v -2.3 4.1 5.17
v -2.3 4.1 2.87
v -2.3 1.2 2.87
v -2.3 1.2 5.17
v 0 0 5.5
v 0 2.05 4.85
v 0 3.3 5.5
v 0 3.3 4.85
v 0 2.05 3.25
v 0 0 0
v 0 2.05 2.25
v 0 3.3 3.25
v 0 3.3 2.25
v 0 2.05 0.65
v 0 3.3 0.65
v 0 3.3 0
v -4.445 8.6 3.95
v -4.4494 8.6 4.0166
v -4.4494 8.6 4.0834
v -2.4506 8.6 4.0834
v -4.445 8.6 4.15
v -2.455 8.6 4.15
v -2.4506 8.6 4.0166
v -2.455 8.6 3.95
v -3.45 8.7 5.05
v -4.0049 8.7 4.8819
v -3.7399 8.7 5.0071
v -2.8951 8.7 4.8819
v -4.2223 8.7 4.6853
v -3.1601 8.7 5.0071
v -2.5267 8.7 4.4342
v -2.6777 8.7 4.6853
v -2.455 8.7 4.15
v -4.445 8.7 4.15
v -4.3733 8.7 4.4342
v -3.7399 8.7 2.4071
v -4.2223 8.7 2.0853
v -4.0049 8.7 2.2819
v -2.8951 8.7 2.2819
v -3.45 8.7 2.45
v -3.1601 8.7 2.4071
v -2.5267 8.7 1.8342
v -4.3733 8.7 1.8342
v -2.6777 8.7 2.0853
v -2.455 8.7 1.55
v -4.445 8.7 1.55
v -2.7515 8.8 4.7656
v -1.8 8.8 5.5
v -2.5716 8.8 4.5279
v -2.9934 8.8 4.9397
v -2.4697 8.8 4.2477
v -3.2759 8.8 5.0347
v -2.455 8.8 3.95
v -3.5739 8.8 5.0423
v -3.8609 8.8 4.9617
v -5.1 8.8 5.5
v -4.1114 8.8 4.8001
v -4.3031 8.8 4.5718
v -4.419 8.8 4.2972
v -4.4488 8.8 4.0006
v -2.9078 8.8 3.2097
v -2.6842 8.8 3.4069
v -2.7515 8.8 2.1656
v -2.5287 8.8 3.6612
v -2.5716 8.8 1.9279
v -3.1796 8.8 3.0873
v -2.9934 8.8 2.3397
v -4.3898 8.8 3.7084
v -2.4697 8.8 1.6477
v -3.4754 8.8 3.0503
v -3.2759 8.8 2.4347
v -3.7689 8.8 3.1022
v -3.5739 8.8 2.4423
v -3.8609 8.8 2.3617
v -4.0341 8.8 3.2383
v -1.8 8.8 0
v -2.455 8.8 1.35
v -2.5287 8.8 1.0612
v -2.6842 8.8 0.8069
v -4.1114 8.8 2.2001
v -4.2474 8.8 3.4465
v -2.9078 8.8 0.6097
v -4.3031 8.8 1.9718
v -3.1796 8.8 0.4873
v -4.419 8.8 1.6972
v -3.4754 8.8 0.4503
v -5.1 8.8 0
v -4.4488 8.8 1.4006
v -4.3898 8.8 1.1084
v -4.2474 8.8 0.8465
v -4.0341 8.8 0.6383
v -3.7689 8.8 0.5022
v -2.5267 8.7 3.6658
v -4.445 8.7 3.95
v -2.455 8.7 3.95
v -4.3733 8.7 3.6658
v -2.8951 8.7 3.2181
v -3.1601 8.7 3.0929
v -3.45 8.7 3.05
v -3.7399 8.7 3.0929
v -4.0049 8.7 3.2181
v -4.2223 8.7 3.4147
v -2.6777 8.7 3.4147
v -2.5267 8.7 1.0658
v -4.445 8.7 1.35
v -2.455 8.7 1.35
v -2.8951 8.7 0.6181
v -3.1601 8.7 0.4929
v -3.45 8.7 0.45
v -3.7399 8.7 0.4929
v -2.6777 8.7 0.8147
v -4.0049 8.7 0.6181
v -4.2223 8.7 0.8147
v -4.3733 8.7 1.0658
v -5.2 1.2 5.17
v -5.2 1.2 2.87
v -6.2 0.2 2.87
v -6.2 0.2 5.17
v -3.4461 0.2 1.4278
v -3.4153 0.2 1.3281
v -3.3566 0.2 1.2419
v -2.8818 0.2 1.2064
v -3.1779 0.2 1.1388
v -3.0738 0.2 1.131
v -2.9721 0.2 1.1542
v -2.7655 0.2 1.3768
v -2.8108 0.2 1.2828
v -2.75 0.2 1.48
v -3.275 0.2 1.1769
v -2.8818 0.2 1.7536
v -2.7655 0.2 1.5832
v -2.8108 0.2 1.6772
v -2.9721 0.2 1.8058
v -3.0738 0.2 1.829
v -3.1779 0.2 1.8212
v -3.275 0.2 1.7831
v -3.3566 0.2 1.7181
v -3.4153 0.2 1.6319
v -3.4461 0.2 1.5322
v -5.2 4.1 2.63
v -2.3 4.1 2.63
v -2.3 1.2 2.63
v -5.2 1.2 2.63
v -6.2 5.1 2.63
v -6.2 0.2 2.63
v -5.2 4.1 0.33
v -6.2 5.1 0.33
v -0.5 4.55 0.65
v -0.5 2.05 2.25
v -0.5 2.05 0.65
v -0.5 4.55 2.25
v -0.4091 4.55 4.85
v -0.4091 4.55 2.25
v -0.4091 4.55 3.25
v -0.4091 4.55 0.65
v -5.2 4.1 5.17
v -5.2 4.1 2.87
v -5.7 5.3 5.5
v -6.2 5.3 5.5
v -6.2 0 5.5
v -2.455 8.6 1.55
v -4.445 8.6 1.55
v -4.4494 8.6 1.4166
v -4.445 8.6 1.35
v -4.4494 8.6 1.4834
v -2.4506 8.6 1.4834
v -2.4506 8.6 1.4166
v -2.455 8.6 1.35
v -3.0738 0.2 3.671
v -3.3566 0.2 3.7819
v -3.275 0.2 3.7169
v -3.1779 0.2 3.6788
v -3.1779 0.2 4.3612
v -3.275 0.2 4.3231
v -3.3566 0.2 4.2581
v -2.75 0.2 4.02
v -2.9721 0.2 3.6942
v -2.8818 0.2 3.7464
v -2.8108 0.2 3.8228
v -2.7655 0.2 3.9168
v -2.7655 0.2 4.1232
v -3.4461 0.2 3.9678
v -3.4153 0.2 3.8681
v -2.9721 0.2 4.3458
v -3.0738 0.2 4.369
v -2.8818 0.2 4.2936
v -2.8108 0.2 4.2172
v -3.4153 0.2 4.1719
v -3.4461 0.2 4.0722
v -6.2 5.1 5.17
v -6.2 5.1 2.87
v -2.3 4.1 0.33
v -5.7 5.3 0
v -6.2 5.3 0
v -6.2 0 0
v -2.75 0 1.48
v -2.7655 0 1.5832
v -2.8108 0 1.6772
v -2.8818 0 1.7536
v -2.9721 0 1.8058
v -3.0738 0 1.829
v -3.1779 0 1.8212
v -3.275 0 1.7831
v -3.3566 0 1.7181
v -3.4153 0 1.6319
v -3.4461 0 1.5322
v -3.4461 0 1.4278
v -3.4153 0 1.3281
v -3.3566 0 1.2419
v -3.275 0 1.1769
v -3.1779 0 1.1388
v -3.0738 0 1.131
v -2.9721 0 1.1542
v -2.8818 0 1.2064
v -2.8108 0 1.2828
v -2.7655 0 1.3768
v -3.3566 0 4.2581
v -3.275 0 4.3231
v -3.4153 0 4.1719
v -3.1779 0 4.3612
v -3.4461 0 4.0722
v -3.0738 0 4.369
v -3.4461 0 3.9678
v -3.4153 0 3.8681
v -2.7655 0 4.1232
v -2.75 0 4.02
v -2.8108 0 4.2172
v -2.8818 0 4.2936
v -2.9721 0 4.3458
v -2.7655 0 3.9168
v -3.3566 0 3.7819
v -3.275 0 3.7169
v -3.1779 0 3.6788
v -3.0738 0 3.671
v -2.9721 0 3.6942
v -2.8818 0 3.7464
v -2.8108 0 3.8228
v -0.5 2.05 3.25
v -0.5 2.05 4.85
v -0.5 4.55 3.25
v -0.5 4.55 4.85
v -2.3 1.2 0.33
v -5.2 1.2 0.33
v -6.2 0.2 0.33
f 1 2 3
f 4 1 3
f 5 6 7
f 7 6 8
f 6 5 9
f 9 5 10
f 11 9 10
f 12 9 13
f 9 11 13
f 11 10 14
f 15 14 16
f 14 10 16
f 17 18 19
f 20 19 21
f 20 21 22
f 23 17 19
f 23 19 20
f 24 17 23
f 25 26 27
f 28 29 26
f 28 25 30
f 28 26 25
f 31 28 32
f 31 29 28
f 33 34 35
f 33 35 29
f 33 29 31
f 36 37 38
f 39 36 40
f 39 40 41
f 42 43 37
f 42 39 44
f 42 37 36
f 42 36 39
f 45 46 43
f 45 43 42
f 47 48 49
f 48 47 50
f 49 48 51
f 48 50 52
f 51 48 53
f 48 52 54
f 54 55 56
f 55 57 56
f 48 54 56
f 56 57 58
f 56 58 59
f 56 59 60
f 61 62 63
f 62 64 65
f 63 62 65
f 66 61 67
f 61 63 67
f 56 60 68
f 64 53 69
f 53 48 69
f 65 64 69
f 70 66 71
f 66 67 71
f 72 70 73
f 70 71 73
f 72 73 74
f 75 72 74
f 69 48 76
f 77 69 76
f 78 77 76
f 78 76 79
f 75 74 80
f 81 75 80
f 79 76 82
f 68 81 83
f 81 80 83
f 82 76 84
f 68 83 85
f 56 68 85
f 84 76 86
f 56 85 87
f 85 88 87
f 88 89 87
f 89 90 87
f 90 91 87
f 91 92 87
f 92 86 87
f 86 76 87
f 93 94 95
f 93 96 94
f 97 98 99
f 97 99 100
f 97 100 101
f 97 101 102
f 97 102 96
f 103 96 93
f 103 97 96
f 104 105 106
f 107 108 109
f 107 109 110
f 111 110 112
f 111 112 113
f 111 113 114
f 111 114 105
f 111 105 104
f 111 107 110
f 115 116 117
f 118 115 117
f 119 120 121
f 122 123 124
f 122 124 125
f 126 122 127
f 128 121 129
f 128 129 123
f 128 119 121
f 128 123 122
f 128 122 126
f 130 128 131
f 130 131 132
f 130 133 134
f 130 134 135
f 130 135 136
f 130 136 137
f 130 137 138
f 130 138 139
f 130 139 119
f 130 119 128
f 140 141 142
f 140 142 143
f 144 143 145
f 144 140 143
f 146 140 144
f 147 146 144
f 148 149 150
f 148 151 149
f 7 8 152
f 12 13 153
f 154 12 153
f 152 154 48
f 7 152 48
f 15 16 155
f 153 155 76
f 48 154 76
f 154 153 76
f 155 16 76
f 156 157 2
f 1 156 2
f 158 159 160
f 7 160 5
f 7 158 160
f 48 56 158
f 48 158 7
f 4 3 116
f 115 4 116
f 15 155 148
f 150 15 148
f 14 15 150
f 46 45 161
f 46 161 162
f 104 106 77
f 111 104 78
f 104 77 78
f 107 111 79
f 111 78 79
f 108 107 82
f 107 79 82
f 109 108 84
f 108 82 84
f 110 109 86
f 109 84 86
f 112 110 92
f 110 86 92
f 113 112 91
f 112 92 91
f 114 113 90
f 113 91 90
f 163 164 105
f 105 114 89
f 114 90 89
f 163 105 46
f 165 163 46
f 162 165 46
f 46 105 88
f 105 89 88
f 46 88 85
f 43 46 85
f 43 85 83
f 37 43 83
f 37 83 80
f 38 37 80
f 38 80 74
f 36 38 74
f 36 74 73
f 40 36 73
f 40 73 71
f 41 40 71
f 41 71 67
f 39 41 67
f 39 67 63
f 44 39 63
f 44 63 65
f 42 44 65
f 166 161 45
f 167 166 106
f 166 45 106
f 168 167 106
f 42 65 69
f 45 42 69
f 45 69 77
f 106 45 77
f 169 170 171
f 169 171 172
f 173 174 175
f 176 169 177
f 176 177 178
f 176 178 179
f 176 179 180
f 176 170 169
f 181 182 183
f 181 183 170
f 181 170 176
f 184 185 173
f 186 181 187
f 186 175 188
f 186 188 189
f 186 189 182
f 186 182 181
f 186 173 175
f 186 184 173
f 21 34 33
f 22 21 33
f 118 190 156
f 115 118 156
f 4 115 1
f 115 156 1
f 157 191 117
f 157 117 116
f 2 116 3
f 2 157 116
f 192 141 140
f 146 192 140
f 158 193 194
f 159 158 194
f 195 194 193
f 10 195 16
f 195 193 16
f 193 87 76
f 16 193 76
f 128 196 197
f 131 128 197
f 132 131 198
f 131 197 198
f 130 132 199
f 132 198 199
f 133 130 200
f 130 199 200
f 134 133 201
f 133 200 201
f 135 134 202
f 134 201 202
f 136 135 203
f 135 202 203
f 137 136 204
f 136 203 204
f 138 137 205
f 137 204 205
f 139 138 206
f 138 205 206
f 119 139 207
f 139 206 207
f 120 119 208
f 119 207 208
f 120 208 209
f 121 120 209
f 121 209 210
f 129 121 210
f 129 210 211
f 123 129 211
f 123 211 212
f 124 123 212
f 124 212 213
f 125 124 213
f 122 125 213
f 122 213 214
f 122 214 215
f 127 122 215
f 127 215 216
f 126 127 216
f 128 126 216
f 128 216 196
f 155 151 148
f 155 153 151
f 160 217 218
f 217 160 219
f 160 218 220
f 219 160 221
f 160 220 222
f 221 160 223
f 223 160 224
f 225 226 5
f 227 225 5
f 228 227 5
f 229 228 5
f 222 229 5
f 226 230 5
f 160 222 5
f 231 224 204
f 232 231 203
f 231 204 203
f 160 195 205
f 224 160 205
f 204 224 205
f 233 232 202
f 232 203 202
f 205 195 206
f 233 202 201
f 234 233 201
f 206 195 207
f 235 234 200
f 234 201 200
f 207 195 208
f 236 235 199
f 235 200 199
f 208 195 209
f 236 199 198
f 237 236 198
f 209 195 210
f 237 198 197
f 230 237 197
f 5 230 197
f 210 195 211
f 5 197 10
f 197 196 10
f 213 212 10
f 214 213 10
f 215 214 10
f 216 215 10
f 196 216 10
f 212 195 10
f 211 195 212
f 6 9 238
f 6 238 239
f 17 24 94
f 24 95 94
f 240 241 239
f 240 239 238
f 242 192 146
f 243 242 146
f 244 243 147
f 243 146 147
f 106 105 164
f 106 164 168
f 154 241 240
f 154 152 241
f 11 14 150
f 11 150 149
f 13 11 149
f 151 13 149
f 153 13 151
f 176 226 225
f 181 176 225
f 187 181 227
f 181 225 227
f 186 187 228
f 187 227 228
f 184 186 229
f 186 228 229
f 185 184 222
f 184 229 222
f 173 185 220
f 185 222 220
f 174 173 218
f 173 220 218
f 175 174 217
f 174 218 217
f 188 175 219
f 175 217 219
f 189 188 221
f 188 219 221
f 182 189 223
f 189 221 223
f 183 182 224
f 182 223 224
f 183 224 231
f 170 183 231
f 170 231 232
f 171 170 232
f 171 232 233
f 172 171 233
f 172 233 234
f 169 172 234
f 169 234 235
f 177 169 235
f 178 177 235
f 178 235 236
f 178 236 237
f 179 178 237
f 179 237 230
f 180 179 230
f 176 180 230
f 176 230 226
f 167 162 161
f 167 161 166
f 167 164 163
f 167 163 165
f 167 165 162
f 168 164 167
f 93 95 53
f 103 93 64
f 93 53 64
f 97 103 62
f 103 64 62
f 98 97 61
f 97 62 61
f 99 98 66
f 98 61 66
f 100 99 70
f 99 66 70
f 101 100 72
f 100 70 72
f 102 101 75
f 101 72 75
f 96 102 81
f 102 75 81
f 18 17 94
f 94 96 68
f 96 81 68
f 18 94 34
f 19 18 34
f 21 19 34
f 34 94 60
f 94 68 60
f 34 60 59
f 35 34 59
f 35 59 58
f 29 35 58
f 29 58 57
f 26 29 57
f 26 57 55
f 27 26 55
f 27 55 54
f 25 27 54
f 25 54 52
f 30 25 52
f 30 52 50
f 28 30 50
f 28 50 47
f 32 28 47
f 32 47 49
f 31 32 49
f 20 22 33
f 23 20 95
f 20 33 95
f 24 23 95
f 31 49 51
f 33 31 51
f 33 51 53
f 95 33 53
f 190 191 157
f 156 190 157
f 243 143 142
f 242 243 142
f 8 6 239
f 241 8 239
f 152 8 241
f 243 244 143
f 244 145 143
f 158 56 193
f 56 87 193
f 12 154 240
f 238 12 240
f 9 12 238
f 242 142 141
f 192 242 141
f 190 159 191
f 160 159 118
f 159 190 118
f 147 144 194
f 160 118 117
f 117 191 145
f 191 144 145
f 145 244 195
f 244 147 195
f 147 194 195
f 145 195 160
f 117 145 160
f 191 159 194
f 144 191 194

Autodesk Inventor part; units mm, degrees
ref_plane "YZ Plane" through (0, 0, 0) normal (1, 0, 0) x (0, 1, 0)
ref_plane "XZ Plane" through (0, 0, 0) normal (0, 1, 0) x (-1, 0, 0)
sketch "Sketch1" plane through (0, 0, 0) normal (0, 0, 1) x (1, 0, 0)
  line L0 (0, 0) -> (0, 3.3)
  line L1 (0, 3.3) -> (-1.8, 8.8)
  line L2 (-1.8, 8.8) -> (-5.1, 8.8)
  line L3 (-5.1, 8.8) -> (-5.7, 5.3)
  line L4 (-5.7, 5.3) -> (-6.2, 5.3)
  line L5 (-6.2, 5.3) -> (-6.2, 0)
  line L6 (-6.2, 0) -> (0, 0)
  dimension "d0" = 3.3
  dimension "d1" = 3.3
  dimension "d2" = 8.8
  dimension "d3" = 1.8
  dimension "d4" = 5.3
  dimension "d5" = 6.2
  dimension "d6" = 0.5
extrude "Extrusion1" add sketch "Sketch1" along normal blind 5.5
ref_plane "Work Plane2" through (0, 0, 4.02) normal (0, 0, 1) x (1, 0, 0)
ref_plane "Work Plane1" through (0, 0, 2.75) normal (0, 0, 1) x (1, 0, 0)
sketch "Sketch3" plane through (0, 0, 4.02) normal (0, 0, 1) x (1, 0, 0)
  line L0 (-6.2, 5.3) -> (-6.2, 0) projected
  line L1 (-6.2, 5.1) -> (-5.2, 4.1)
  line L2 (-5.2, 4.1) -> (-2.3, 4.1)
  line L3 (-2.3, 4.1) -> (-2.3, 1.2)
  line L4 (-2.3, 1.2) -> (-5.2, 1.2)
  line L5 (-5.2, 1.2) -> (-6.2, 0.2)
  line L6 (-6.2, 5.1) -> (-6.2, 0.2)
  line L7 (-5.7, 5.3) -> (-6.2, 5.3) projected
  line L8 (-6.2, 0) -> (0, 0) projected
  line L9 (-6.2, 2.65) -> (0, 2.65) construction
  line L10 (0, 0) -> (0, 3.3) construction
  dimension "d10" = 0.2
  dimension "d11" = 0.2
  dimension "d12" = 1
  dimension "d13" = 1
extrude "Extrusion2" cut sketch "Sketch3" along normal mid plane 2.3
mirror "Mirror1" about plane through (0, 0, 2.75) normal (0, 0, 1) of "Extrusion2"
sketch "Sketch4" plane through (0, 0, 0) normal (1, 0, 0) x (0, 0, -1)
  line L0 (-4.85, 4.55) -> (-3.25, 4.55)
  line L1 (-3.25, 4.55) -> (-3.25, 2.05)
  line L2 (-3.25, 2.05) -> (-4.85, 2.05)
  line L3 (-4.85, 2.05) -> (-4.85, 4.55)
  line L4 (-4.85, 4.55) -> (-3.25, 2.05) construction
  line L5 (-3.25, 4.55) -> (-4.85, 2.05) construction
  line L6 (-2.25, 4.55) -> (-0.65, 4.55)
  line L7 (-0.65, 4.55) -> (-0.65, 2.05)
  line L8 (-0.65, 2.05) -> (-2.25, 2.05)
  line L9 (-2.25, 2.05) -> (-2.25, 4.55)
  line L10 (-2.25, 4.55) -> (-0.65, 2.05) construction
  line L11 (-0.65, 4.55) -> (-2.25, 2.05) construction
  line L12 (0, 8.8) -> (-5.5, 8.8) construction
  line L13 (-2.75, 8.8) -> (-2.75, 0) construction
  line L14 (0, 0) -> (-5.5, 0) construction
  line L15 (0, 3.3) -> (-5.5, 3.3) construction
  point P0 (-4.05, 3.3)
  point P1 (-1.45, 3.3)
  dimension "d16" = 1.6
  dimension "d17" = 2.5
  dimension "d18" = 1
extrude "Extrusion3" cut sketch "Sketch4" against normal blind 0.5
sketch "Sketch5" plane through (-5.1, 8.8, 0) normal (0, 1, 0) x (1, 0, 0)
  circle A0 centre (1.65, -4.05) radius 1
  line L0 (-1.1, -5.5) -> (5.1, -5.5) construction
  line L1 (3.3, 0) -> (3.3, -5.5) construction
  line L2 (0, -5.5) -> (3.3, -5.5) construction
  line L3 (3.3, -5.5) -> (3.3, 0) construction
  line L4 (3.3, 0) -> (0, 0) construction
  line L5 (0, 0) -> (0, -5.5) construction
  line L6 (1.65, -5.5) -> (1.65, 0) construction
  line L7 (0, 0) -> (0, -5.5) construction
  line L8 (0, -2.75) -> (3.3, -2.75) construction
  line L9 (0.655, -4.15) -> (2.645, -4.15)
  line L10 (2.645, -3.95) -> (0.655, -3.95)
  circle A1 centre (1.65, -1.45) radius 1
  line L11 (1.65, 0) -> (1.65, -5.5) construction
  line L12 (0.655, -1.35) -> (2.645, -1.35)
  line L13 (2.645, -1.55) -> (0.655, -1.55)
  point P0 (5.1, 0)
  dimension "d21" = 2
  dimension "d22" = 0.2
  dimension "d23" = 1.3
  dimension "d24" = 0.1
extrude "Extrusion4" cut sketch "Sketch5" against normal blind 0.1 contours L10 A0 | A0 L9 | L12 A1 | A1 L13
extrude "Extrusion5" cut sketch "Sketch5" against normal blind 0.2 contours A0 L9 L10 | A1 L13 L12
sketch "Sketch6" plane through (-6.2, 0, 0) normal (0, -1, 0) x (1, 0, 0)
  circle A0 centre (3.1, 4.02) radius 0.35
  circle A1 centre (3.1, 1.48) radius 0.35
  line L0 (6.2, 2.25) -> (6.2, 3.25) construction
  line L1 (6.2, 2.75) -> (0, 2.75) construction
  line L2 (0, 2.63) -> (1, 2.63) construction
  line L3 (6.2, 0) -> (6.2, 5.5) construction
  dimension "d29" = 0.7
  dimension "d30" = 2.54
  dimension "d31" = 3.1
extrude "Extrusion6" cut sketch "Sketch6" against normal blind 0.2
properties part number "CAN_bus_wire"
